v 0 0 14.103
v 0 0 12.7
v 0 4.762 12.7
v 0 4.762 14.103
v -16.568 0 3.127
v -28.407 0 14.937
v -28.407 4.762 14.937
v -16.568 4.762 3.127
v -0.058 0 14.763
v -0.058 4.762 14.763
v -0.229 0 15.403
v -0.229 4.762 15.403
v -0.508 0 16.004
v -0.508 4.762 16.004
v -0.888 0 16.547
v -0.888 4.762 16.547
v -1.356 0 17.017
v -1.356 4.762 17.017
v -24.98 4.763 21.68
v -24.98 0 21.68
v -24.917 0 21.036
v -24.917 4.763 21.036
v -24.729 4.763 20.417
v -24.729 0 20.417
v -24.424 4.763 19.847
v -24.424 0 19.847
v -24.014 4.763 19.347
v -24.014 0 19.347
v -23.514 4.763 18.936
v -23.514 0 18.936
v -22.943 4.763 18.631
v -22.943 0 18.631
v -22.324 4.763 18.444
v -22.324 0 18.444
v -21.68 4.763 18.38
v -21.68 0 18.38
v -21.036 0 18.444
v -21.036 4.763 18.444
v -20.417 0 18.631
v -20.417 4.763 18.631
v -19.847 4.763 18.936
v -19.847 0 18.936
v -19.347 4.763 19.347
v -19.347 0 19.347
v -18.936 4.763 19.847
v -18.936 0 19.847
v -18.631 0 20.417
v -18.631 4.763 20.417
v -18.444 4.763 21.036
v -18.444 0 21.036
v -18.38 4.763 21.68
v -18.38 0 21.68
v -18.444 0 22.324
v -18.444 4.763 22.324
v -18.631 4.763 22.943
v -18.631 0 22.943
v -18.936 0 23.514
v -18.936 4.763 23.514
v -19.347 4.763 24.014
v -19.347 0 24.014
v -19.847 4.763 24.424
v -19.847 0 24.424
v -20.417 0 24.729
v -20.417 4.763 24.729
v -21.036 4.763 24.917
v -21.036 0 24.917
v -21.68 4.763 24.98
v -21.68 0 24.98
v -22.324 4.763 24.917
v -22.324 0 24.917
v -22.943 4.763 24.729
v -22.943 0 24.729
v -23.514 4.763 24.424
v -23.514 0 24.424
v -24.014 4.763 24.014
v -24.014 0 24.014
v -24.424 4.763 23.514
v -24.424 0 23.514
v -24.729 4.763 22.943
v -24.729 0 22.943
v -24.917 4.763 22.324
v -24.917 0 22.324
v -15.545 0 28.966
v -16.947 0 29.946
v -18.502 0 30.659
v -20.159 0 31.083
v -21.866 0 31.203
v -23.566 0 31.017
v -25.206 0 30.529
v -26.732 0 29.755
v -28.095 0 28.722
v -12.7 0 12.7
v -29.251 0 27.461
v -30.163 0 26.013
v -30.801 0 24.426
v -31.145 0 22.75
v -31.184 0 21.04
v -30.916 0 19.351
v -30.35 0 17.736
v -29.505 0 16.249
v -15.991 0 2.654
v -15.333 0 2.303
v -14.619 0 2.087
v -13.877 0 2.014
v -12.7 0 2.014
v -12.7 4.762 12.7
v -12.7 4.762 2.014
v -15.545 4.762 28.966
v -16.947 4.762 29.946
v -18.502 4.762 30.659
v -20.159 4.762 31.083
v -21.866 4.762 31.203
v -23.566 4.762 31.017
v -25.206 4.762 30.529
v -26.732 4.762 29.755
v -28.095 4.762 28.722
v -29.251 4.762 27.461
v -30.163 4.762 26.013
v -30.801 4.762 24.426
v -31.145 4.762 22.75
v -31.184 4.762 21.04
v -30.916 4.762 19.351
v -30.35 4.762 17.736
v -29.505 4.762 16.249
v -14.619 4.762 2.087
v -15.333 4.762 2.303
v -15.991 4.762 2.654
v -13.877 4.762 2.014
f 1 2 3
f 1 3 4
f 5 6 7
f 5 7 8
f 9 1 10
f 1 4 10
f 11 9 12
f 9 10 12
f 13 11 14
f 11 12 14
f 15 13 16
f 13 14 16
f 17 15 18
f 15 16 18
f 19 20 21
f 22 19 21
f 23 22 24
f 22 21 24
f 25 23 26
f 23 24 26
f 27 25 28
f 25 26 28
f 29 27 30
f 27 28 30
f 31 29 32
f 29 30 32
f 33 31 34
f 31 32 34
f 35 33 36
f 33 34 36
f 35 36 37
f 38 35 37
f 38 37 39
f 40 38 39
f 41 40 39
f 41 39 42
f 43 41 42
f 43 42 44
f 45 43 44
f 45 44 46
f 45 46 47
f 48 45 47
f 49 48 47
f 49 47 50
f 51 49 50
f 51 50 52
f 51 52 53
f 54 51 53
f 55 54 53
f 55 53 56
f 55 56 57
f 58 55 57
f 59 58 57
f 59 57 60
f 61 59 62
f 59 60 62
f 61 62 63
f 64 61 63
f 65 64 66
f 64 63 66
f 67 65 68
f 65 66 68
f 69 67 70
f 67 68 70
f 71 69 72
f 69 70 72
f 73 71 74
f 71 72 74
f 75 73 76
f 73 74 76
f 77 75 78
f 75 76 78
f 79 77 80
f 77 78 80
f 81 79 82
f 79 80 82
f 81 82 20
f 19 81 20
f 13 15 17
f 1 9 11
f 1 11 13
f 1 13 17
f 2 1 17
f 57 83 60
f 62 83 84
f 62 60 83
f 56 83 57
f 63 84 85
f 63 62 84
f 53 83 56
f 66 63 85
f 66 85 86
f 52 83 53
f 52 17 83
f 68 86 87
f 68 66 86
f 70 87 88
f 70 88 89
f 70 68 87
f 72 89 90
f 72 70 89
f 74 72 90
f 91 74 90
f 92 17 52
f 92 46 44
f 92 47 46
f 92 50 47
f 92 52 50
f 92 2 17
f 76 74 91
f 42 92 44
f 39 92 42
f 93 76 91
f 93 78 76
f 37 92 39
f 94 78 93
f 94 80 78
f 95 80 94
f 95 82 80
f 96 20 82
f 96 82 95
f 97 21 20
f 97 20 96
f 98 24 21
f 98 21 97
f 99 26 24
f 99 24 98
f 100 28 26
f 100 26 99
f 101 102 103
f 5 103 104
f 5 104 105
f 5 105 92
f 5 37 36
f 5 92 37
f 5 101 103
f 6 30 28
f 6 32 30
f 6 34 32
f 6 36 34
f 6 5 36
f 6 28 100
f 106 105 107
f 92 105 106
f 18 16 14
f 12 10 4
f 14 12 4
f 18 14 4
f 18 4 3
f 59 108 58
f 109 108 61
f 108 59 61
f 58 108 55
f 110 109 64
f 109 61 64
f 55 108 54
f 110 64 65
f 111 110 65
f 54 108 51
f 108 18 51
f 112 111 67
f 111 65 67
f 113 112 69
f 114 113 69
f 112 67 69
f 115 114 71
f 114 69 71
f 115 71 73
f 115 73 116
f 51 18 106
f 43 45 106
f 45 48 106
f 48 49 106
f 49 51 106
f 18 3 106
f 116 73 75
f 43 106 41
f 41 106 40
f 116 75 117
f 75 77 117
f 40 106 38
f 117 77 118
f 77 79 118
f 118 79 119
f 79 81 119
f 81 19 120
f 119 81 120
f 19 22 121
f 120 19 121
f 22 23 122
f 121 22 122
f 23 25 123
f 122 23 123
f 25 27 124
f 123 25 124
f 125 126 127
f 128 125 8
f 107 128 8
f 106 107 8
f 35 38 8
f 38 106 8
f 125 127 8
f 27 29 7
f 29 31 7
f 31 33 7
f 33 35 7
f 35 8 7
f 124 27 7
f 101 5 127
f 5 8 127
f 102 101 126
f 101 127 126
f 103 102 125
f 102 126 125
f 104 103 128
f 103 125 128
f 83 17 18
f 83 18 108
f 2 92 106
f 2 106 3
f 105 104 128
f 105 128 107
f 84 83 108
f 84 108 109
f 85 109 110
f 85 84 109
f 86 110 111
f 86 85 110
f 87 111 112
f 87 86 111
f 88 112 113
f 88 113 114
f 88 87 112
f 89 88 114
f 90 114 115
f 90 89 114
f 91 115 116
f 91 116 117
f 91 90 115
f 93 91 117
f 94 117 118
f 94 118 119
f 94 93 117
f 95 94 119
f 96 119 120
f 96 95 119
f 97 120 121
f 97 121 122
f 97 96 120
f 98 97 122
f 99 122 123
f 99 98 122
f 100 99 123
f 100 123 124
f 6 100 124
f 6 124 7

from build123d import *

# Parameters (mm, degrees)
BOSS_EXTRUDE2_DEPTH  = 4.7625
FILLET3_R            = 3.81
M6_CLEARANCE_HOLE3_D = 6.6


with BuildPart() as part:
    # Sketch4 → Boss-Extrude2 (new body)
    with BuildSketch(Plane(origin=(0, 0, 0), x_dir=(1, 0, 0), z_dir=(0, 1, 0))):
        with BuildLine():
            Line((-12.7, -2.013948776), (-12.7, -12.7))
            Line((-12.7, -12.7), (0, -12.7))
            Line((0, -12.7), (0, -15.875))
            Line((0, -15.875), (-15.544691969, -28.965891134))
            ThreePointArc((-15.544691969, -28.965891134), (-28.701038648, -28.117199317), (-28.407157173, -14.936783186))
            Line((-28.407157173, -14.936783186), (-15.452487049, -2.013948776))
            Line((-15.452487049, -2.013948776), (-12.7, -2.013948776))
        make_face()
    extrude(amount=BOSS_EXTRUDE2_DEPTH)

    # Fillet3
    fillet3_edges = [part.edges().sort_by_distance(p)[0] for p in [
        (0, 2.38125, 15.875),
        (-15.452487049, 2.38125, 2.013948776),
    ]]
    fillet(fillet3_edges, radius=FILLET3_R)

    # M6 Clearance Hole3 (through all)
    with Locations(Plane(origin=(0, 4.7625, 0), x_dir=(1, 0, 0), z_dir=(0, 1, 0))):
        with Locations((-21.680256121, -21.680256121)):
            Hole(M6_CLEARANCE_HOLE3_D / 2)


solid = part.part
